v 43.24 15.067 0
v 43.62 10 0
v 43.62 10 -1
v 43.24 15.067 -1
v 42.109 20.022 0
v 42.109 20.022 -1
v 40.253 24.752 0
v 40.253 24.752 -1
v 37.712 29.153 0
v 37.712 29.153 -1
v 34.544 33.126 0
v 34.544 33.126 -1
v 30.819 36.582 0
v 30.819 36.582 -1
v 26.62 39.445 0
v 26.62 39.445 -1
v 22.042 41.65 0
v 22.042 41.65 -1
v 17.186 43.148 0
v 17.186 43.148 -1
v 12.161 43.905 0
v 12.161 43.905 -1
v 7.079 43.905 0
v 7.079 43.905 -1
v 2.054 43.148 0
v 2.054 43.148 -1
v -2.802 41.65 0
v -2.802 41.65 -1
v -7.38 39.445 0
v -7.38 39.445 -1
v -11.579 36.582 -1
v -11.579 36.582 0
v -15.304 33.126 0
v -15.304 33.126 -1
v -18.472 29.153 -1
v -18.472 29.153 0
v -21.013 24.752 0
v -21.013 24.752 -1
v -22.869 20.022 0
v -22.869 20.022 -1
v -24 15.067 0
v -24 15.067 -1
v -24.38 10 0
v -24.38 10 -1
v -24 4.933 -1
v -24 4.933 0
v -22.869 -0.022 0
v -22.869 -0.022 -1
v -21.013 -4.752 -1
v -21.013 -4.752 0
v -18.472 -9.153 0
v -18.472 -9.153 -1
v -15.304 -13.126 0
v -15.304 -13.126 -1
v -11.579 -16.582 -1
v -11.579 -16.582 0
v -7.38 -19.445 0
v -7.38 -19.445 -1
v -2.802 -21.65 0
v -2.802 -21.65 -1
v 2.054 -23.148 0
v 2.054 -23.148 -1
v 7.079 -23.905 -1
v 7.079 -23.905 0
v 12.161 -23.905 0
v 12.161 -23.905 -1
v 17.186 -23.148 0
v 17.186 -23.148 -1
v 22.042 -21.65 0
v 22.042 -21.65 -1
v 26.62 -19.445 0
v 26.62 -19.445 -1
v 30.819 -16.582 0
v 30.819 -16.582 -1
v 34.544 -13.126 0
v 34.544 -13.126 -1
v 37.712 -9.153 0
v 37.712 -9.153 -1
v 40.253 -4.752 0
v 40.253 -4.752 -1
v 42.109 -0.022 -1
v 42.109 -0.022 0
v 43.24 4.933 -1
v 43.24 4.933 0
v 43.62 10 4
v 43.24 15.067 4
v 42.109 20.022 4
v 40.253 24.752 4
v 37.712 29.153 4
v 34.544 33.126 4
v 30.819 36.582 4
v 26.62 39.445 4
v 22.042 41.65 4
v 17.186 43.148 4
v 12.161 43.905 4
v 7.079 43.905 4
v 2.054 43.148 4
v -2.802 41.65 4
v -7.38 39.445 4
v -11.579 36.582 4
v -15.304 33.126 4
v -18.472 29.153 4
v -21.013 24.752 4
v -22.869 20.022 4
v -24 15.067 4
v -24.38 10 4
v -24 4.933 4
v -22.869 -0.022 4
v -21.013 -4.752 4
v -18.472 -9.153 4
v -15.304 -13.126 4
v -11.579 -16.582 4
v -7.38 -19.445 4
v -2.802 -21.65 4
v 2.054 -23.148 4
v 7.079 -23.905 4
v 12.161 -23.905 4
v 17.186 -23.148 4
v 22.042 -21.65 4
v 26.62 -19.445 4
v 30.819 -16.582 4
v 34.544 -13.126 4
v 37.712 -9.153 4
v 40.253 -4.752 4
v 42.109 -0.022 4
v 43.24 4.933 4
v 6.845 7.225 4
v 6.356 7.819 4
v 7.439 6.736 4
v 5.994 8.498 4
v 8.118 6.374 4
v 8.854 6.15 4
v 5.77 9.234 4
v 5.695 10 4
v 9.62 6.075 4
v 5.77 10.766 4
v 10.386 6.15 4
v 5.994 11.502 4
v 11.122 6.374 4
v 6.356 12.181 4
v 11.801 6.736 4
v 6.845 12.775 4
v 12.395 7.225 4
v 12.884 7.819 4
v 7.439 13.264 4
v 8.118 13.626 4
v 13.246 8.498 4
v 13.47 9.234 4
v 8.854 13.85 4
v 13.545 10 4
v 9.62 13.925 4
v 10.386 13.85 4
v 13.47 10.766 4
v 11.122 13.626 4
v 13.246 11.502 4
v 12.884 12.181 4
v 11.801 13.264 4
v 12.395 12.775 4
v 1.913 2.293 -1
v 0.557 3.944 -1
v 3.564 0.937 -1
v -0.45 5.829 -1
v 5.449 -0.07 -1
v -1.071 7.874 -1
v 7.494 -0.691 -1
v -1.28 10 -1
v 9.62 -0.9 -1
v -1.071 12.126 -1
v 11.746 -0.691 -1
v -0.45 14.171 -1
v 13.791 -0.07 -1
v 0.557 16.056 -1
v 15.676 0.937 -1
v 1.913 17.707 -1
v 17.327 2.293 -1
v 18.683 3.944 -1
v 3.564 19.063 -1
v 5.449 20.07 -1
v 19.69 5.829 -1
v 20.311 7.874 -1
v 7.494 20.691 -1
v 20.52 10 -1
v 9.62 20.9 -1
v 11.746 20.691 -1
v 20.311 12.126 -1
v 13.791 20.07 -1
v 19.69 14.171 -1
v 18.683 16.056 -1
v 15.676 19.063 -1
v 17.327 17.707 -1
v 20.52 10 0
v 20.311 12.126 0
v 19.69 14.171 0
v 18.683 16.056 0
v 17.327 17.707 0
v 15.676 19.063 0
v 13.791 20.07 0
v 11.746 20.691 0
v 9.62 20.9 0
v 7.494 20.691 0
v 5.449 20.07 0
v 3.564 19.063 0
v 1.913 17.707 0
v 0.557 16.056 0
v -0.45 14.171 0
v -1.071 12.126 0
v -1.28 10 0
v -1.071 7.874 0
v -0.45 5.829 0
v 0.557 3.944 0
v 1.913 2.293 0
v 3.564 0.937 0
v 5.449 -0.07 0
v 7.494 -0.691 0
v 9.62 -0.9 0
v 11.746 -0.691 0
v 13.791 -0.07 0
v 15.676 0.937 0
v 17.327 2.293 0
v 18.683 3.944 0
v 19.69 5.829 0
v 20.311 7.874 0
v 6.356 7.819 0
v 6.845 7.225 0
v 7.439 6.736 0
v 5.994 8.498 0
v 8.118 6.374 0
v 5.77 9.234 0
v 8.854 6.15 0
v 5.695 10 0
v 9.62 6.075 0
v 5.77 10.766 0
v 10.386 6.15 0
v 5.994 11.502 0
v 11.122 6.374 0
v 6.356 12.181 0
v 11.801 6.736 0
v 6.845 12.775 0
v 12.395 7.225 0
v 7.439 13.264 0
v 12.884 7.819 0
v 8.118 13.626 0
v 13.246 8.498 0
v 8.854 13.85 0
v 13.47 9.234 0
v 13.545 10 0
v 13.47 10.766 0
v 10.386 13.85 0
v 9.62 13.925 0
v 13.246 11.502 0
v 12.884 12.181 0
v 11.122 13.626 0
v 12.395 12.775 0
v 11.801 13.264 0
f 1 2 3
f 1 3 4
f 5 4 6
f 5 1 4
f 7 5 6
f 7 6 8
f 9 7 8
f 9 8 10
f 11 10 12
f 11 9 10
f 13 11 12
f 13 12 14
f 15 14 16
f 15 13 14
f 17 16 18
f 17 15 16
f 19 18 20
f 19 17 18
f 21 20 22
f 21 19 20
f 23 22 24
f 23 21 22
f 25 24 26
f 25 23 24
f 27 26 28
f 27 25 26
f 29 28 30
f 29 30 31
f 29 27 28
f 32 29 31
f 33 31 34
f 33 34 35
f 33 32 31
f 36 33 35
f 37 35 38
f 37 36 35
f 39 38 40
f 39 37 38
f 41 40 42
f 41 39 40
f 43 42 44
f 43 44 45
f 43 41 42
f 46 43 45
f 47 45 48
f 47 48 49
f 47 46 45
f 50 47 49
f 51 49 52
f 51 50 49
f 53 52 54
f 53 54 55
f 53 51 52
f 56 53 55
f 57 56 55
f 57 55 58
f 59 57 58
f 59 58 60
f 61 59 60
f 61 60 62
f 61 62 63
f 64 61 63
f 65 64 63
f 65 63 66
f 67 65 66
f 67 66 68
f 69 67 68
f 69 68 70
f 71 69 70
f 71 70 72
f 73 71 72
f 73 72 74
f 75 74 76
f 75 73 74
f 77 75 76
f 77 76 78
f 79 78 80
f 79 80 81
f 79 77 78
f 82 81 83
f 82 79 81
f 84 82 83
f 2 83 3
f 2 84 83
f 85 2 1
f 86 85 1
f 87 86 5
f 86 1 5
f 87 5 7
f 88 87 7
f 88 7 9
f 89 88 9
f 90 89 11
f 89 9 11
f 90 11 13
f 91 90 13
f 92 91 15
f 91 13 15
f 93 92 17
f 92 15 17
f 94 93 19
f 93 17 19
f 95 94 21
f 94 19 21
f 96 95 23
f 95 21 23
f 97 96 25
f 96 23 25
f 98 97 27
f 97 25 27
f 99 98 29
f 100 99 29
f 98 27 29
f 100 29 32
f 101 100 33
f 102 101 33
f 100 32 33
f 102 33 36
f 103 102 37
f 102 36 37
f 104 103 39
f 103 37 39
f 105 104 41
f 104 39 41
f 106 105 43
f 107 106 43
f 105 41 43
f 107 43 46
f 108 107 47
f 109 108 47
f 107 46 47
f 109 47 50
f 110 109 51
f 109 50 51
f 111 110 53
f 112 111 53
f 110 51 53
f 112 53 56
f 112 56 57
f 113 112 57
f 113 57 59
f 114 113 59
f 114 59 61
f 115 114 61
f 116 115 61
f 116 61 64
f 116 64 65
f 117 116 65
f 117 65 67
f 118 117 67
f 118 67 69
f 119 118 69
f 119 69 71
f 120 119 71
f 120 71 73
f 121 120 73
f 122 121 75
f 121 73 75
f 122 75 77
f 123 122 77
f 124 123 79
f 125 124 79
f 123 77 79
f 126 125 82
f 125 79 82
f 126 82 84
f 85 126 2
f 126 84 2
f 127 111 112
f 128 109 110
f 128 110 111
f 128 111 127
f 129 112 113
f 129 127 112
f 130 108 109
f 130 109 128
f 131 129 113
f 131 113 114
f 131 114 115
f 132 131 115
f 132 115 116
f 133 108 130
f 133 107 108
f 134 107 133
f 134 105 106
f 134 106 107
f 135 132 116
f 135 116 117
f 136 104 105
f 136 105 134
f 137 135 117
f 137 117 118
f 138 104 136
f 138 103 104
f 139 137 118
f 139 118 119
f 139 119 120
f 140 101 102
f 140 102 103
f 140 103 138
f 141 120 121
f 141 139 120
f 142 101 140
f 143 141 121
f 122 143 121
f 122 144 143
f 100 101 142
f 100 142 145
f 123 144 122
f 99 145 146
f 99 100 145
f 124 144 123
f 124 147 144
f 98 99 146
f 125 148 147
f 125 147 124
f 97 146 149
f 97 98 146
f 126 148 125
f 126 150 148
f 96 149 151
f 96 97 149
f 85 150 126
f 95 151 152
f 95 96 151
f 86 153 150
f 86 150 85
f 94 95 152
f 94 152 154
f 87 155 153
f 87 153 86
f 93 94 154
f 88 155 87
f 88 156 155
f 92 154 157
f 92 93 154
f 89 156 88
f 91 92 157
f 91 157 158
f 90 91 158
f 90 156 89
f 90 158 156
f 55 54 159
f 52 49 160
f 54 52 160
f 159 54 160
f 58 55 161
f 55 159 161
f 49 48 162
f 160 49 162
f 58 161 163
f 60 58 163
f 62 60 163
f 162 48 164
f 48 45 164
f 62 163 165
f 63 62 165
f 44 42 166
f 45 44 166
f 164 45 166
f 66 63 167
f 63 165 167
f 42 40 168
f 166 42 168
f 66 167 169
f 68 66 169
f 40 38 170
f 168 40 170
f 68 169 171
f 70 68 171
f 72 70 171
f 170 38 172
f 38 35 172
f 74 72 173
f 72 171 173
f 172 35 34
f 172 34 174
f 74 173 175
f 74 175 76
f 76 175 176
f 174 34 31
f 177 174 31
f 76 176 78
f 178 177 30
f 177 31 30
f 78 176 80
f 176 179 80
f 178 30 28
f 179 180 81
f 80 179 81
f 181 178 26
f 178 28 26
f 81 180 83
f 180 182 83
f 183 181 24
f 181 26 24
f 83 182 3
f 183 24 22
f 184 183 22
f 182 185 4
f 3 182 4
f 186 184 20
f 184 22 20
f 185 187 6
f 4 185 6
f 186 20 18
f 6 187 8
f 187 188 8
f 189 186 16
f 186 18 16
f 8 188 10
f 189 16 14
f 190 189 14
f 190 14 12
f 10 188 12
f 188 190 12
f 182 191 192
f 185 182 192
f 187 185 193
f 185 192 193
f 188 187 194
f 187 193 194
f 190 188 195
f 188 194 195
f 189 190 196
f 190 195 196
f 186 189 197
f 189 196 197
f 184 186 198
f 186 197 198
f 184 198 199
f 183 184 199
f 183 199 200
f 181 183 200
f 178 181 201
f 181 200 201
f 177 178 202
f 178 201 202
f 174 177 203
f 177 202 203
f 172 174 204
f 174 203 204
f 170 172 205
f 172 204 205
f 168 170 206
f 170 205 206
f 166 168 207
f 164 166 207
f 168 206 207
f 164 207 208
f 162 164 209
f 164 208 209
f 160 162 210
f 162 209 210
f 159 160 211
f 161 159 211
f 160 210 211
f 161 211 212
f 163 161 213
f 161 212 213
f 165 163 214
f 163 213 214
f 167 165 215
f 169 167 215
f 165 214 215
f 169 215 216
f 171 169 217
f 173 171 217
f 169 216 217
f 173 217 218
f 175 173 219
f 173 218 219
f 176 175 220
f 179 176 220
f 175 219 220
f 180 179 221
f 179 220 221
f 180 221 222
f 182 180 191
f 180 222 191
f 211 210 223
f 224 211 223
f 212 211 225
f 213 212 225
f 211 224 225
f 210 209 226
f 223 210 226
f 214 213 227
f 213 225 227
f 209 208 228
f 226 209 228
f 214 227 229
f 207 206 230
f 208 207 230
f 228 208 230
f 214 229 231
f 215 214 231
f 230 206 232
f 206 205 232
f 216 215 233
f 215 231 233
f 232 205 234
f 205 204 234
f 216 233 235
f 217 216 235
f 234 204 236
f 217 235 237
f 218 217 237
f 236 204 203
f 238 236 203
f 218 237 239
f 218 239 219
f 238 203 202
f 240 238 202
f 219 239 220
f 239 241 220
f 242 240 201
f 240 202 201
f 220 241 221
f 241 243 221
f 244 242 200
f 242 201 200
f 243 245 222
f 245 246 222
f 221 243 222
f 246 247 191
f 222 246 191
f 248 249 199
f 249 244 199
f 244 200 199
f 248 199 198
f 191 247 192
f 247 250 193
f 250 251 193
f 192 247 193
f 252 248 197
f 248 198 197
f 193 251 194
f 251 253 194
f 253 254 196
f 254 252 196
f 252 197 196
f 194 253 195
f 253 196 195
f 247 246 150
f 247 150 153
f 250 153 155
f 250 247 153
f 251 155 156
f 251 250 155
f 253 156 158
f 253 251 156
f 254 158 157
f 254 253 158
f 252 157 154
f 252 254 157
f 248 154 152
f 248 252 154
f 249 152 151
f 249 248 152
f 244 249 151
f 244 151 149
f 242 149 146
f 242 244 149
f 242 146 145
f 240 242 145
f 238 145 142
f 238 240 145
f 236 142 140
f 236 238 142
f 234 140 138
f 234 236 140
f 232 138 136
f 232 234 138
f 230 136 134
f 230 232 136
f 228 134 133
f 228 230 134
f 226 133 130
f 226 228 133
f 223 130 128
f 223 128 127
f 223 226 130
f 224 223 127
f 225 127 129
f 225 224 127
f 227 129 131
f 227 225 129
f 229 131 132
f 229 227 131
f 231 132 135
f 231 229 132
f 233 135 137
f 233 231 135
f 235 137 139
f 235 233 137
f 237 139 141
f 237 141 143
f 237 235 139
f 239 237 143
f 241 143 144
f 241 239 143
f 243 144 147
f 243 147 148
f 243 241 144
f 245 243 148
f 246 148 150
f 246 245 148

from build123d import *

# Parameters (mm, degrees)
SKETCH3_R           = 34
SKETCH3_R_2         = 10.9
BOSS_EXTRUDE2_DEPTH = 1
SKETCH4_R           = 34
SKETCH4_R_2         = 3.925
BOSS_EXTRUDE3_DEPTH = 4


with BuildPart() as part:
    # Sketch3 → Boss-Extrude2 (new body)
    with BuildSketch(Plane.XY):
        with Locations((9.62, 10)):
            Circle(SKETCH3_R)
        with Locations((9.62, 10)):
            Circle(SKETCH3_R_2, mode=Mode.SUBTRACT)
    extrude(amount=-BOSS_EXTRUDE2_DEPTH)

    # Sketch4 → Boss-Extrude3 (add)
    with BuildSketch(Plane.XY):
        with Locations((9.62, 10)):
            Circle(SKETCH4_R)
        with Locations((9.62, 10)):
            Circle(SKETCH4_R_2, mode=Mode.SUBTRACT)
    extrude(amount=BOSS_EXTRUDE3_DEPTH)


solid = part.part
